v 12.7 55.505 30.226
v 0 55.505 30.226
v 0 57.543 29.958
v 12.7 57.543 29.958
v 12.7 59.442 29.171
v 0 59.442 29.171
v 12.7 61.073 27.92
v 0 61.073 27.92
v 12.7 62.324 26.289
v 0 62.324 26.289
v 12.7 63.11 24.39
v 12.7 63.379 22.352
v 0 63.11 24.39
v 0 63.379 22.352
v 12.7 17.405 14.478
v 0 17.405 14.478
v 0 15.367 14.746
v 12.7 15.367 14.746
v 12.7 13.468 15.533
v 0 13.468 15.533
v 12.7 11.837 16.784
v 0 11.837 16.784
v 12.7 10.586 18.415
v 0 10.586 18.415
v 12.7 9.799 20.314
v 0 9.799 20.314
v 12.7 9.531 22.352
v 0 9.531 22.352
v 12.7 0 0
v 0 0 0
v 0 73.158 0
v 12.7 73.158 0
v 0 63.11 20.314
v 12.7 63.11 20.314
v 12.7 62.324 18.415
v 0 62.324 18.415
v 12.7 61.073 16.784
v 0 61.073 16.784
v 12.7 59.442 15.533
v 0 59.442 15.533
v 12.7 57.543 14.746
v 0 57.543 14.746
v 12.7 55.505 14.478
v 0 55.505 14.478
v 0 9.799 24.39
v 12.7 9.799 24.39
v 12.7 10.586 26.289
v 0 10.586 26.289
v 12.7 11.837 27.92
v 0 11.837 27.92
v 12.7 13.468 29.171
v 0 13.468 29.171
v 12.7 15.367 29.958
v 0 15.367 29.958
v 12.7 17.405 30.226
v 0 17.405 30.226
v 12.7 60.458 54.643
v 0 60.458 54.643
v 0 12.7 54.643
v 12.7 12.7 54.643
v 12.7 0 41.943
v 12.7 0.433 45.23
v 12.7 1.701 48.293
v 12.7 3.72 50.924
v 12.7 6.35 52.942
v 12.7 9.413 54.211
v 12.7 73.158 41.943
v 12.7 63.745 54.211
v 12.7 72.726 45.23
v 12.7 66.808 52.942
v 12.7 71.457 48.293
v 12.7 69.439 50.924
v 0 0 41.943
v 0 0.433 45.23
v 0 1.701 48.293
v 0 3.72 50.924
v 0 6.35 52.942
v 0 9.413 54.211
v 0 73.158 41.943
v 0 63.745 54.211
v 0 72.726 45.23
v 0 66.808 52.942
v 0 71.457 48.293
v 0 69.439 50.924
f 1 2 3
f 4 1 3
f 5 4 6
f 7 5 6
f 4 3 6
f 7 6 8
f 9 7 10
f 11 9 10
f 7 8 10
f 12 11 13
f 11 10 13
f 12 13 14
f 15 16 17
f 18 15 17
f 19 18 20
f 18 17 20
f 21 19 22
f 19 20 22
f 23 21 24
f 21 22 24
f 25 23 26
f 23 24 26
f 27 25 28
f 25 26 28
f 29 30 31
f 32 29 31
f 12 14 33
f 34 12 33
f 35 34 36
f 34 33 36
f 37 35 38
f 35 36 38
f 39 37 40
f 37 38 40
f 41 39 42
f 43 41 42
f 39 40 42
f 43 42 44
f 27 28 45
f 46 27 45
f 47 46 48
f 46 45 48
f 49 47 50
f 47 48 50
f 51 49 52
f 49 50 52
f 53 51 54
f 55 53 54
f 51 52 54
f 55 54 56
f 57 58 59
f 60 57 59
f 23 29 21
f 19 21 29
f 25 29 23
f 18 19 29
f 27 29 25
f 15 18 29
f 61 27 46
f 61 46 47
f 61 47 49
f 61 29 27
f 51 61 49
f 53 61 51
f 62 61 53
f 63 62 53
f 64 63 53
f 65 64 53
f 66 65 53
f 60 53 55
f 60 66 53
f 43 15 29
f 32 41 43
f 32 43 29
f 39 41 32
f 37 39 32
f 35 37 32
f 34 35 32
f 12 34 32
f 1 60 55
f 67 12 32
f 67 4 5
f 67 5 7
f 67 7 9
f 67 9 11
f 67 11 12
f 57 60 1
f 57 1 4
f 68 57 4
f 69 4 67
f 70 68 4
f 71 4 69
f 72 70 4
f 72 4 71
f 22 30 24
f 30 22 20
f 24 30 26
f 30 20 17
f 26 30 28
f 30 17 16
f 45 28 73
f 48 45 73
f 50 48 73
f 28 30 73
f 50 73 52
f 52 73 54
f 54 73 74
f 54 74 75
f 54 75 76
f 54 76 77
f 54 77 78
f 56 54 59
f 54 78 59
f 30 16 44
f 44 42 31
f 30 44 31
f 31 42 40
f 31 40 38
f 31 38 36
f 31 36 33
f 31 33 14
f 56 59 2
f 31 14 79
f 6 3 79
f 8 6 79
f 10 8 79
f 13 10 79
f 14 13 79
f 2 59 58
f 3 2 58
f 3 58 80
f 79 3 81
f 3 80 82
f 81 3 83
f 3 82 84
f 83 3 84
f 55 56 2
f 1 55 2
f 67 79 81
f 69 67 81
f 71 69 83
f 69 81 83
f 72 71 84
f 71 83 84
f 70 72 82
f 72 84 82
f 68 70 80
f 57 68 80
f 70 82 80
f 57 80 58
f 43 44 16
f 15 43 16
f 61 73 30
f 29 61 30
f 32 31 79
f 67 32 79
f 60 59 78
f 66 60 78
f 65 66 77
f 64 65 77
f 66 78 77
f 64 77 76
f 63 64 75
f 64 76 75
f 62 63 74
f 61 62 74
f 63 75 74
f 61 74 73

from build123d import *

# Parameters (mm, degrees)
F1_DEPTH = 12.7


with BuildPart() as f1:
    # F0 (on Right) → F1 (new body)
    with BuildSketch(Plane.YZ):
        with BuildLine():
            Line((0, 41.94333), (0, 0))
            Line((0, 0), (73.158316, 0))
            Line((73.158316, 0), (73.158316, 41.94333))
            ThreePointArc((73.158316, 41.94333), (69.438572, 50.923586), (60.458316, 54.64333))
            Line((60.458316, 54.64333), (12.7, 54.64333))
            ThreePointArc((12.7, 54.64333), (3.719744, 50.923586), (0, 41.94333))
        make_face()
        with BuildLine():
            ThreePointArc((9.530765, 22.352), (11.837006, 27.919759), (17.404765, 30.226))
            Line((17.404765, 30.226), (55.504765, 30.226))
            ThreePointArc((55.504765, 30.226), (61.072524, 27.919759), (63.378765, 22.352))
            ThreePointArc((63.378765, 22.352), (61.072524, 16.784241), (55.504765, 14.478))
            Line((55.504765, 14.478), (17.404765, 14.478))
            ThreePointArc((17.404765, 14.478), (11.837006, 16.784241), (9.530765, 22.352))
        make_face(mode=Mode.SUBTRACT)
    extrude(amount=F1_DEPTH)


solid = f1.part
